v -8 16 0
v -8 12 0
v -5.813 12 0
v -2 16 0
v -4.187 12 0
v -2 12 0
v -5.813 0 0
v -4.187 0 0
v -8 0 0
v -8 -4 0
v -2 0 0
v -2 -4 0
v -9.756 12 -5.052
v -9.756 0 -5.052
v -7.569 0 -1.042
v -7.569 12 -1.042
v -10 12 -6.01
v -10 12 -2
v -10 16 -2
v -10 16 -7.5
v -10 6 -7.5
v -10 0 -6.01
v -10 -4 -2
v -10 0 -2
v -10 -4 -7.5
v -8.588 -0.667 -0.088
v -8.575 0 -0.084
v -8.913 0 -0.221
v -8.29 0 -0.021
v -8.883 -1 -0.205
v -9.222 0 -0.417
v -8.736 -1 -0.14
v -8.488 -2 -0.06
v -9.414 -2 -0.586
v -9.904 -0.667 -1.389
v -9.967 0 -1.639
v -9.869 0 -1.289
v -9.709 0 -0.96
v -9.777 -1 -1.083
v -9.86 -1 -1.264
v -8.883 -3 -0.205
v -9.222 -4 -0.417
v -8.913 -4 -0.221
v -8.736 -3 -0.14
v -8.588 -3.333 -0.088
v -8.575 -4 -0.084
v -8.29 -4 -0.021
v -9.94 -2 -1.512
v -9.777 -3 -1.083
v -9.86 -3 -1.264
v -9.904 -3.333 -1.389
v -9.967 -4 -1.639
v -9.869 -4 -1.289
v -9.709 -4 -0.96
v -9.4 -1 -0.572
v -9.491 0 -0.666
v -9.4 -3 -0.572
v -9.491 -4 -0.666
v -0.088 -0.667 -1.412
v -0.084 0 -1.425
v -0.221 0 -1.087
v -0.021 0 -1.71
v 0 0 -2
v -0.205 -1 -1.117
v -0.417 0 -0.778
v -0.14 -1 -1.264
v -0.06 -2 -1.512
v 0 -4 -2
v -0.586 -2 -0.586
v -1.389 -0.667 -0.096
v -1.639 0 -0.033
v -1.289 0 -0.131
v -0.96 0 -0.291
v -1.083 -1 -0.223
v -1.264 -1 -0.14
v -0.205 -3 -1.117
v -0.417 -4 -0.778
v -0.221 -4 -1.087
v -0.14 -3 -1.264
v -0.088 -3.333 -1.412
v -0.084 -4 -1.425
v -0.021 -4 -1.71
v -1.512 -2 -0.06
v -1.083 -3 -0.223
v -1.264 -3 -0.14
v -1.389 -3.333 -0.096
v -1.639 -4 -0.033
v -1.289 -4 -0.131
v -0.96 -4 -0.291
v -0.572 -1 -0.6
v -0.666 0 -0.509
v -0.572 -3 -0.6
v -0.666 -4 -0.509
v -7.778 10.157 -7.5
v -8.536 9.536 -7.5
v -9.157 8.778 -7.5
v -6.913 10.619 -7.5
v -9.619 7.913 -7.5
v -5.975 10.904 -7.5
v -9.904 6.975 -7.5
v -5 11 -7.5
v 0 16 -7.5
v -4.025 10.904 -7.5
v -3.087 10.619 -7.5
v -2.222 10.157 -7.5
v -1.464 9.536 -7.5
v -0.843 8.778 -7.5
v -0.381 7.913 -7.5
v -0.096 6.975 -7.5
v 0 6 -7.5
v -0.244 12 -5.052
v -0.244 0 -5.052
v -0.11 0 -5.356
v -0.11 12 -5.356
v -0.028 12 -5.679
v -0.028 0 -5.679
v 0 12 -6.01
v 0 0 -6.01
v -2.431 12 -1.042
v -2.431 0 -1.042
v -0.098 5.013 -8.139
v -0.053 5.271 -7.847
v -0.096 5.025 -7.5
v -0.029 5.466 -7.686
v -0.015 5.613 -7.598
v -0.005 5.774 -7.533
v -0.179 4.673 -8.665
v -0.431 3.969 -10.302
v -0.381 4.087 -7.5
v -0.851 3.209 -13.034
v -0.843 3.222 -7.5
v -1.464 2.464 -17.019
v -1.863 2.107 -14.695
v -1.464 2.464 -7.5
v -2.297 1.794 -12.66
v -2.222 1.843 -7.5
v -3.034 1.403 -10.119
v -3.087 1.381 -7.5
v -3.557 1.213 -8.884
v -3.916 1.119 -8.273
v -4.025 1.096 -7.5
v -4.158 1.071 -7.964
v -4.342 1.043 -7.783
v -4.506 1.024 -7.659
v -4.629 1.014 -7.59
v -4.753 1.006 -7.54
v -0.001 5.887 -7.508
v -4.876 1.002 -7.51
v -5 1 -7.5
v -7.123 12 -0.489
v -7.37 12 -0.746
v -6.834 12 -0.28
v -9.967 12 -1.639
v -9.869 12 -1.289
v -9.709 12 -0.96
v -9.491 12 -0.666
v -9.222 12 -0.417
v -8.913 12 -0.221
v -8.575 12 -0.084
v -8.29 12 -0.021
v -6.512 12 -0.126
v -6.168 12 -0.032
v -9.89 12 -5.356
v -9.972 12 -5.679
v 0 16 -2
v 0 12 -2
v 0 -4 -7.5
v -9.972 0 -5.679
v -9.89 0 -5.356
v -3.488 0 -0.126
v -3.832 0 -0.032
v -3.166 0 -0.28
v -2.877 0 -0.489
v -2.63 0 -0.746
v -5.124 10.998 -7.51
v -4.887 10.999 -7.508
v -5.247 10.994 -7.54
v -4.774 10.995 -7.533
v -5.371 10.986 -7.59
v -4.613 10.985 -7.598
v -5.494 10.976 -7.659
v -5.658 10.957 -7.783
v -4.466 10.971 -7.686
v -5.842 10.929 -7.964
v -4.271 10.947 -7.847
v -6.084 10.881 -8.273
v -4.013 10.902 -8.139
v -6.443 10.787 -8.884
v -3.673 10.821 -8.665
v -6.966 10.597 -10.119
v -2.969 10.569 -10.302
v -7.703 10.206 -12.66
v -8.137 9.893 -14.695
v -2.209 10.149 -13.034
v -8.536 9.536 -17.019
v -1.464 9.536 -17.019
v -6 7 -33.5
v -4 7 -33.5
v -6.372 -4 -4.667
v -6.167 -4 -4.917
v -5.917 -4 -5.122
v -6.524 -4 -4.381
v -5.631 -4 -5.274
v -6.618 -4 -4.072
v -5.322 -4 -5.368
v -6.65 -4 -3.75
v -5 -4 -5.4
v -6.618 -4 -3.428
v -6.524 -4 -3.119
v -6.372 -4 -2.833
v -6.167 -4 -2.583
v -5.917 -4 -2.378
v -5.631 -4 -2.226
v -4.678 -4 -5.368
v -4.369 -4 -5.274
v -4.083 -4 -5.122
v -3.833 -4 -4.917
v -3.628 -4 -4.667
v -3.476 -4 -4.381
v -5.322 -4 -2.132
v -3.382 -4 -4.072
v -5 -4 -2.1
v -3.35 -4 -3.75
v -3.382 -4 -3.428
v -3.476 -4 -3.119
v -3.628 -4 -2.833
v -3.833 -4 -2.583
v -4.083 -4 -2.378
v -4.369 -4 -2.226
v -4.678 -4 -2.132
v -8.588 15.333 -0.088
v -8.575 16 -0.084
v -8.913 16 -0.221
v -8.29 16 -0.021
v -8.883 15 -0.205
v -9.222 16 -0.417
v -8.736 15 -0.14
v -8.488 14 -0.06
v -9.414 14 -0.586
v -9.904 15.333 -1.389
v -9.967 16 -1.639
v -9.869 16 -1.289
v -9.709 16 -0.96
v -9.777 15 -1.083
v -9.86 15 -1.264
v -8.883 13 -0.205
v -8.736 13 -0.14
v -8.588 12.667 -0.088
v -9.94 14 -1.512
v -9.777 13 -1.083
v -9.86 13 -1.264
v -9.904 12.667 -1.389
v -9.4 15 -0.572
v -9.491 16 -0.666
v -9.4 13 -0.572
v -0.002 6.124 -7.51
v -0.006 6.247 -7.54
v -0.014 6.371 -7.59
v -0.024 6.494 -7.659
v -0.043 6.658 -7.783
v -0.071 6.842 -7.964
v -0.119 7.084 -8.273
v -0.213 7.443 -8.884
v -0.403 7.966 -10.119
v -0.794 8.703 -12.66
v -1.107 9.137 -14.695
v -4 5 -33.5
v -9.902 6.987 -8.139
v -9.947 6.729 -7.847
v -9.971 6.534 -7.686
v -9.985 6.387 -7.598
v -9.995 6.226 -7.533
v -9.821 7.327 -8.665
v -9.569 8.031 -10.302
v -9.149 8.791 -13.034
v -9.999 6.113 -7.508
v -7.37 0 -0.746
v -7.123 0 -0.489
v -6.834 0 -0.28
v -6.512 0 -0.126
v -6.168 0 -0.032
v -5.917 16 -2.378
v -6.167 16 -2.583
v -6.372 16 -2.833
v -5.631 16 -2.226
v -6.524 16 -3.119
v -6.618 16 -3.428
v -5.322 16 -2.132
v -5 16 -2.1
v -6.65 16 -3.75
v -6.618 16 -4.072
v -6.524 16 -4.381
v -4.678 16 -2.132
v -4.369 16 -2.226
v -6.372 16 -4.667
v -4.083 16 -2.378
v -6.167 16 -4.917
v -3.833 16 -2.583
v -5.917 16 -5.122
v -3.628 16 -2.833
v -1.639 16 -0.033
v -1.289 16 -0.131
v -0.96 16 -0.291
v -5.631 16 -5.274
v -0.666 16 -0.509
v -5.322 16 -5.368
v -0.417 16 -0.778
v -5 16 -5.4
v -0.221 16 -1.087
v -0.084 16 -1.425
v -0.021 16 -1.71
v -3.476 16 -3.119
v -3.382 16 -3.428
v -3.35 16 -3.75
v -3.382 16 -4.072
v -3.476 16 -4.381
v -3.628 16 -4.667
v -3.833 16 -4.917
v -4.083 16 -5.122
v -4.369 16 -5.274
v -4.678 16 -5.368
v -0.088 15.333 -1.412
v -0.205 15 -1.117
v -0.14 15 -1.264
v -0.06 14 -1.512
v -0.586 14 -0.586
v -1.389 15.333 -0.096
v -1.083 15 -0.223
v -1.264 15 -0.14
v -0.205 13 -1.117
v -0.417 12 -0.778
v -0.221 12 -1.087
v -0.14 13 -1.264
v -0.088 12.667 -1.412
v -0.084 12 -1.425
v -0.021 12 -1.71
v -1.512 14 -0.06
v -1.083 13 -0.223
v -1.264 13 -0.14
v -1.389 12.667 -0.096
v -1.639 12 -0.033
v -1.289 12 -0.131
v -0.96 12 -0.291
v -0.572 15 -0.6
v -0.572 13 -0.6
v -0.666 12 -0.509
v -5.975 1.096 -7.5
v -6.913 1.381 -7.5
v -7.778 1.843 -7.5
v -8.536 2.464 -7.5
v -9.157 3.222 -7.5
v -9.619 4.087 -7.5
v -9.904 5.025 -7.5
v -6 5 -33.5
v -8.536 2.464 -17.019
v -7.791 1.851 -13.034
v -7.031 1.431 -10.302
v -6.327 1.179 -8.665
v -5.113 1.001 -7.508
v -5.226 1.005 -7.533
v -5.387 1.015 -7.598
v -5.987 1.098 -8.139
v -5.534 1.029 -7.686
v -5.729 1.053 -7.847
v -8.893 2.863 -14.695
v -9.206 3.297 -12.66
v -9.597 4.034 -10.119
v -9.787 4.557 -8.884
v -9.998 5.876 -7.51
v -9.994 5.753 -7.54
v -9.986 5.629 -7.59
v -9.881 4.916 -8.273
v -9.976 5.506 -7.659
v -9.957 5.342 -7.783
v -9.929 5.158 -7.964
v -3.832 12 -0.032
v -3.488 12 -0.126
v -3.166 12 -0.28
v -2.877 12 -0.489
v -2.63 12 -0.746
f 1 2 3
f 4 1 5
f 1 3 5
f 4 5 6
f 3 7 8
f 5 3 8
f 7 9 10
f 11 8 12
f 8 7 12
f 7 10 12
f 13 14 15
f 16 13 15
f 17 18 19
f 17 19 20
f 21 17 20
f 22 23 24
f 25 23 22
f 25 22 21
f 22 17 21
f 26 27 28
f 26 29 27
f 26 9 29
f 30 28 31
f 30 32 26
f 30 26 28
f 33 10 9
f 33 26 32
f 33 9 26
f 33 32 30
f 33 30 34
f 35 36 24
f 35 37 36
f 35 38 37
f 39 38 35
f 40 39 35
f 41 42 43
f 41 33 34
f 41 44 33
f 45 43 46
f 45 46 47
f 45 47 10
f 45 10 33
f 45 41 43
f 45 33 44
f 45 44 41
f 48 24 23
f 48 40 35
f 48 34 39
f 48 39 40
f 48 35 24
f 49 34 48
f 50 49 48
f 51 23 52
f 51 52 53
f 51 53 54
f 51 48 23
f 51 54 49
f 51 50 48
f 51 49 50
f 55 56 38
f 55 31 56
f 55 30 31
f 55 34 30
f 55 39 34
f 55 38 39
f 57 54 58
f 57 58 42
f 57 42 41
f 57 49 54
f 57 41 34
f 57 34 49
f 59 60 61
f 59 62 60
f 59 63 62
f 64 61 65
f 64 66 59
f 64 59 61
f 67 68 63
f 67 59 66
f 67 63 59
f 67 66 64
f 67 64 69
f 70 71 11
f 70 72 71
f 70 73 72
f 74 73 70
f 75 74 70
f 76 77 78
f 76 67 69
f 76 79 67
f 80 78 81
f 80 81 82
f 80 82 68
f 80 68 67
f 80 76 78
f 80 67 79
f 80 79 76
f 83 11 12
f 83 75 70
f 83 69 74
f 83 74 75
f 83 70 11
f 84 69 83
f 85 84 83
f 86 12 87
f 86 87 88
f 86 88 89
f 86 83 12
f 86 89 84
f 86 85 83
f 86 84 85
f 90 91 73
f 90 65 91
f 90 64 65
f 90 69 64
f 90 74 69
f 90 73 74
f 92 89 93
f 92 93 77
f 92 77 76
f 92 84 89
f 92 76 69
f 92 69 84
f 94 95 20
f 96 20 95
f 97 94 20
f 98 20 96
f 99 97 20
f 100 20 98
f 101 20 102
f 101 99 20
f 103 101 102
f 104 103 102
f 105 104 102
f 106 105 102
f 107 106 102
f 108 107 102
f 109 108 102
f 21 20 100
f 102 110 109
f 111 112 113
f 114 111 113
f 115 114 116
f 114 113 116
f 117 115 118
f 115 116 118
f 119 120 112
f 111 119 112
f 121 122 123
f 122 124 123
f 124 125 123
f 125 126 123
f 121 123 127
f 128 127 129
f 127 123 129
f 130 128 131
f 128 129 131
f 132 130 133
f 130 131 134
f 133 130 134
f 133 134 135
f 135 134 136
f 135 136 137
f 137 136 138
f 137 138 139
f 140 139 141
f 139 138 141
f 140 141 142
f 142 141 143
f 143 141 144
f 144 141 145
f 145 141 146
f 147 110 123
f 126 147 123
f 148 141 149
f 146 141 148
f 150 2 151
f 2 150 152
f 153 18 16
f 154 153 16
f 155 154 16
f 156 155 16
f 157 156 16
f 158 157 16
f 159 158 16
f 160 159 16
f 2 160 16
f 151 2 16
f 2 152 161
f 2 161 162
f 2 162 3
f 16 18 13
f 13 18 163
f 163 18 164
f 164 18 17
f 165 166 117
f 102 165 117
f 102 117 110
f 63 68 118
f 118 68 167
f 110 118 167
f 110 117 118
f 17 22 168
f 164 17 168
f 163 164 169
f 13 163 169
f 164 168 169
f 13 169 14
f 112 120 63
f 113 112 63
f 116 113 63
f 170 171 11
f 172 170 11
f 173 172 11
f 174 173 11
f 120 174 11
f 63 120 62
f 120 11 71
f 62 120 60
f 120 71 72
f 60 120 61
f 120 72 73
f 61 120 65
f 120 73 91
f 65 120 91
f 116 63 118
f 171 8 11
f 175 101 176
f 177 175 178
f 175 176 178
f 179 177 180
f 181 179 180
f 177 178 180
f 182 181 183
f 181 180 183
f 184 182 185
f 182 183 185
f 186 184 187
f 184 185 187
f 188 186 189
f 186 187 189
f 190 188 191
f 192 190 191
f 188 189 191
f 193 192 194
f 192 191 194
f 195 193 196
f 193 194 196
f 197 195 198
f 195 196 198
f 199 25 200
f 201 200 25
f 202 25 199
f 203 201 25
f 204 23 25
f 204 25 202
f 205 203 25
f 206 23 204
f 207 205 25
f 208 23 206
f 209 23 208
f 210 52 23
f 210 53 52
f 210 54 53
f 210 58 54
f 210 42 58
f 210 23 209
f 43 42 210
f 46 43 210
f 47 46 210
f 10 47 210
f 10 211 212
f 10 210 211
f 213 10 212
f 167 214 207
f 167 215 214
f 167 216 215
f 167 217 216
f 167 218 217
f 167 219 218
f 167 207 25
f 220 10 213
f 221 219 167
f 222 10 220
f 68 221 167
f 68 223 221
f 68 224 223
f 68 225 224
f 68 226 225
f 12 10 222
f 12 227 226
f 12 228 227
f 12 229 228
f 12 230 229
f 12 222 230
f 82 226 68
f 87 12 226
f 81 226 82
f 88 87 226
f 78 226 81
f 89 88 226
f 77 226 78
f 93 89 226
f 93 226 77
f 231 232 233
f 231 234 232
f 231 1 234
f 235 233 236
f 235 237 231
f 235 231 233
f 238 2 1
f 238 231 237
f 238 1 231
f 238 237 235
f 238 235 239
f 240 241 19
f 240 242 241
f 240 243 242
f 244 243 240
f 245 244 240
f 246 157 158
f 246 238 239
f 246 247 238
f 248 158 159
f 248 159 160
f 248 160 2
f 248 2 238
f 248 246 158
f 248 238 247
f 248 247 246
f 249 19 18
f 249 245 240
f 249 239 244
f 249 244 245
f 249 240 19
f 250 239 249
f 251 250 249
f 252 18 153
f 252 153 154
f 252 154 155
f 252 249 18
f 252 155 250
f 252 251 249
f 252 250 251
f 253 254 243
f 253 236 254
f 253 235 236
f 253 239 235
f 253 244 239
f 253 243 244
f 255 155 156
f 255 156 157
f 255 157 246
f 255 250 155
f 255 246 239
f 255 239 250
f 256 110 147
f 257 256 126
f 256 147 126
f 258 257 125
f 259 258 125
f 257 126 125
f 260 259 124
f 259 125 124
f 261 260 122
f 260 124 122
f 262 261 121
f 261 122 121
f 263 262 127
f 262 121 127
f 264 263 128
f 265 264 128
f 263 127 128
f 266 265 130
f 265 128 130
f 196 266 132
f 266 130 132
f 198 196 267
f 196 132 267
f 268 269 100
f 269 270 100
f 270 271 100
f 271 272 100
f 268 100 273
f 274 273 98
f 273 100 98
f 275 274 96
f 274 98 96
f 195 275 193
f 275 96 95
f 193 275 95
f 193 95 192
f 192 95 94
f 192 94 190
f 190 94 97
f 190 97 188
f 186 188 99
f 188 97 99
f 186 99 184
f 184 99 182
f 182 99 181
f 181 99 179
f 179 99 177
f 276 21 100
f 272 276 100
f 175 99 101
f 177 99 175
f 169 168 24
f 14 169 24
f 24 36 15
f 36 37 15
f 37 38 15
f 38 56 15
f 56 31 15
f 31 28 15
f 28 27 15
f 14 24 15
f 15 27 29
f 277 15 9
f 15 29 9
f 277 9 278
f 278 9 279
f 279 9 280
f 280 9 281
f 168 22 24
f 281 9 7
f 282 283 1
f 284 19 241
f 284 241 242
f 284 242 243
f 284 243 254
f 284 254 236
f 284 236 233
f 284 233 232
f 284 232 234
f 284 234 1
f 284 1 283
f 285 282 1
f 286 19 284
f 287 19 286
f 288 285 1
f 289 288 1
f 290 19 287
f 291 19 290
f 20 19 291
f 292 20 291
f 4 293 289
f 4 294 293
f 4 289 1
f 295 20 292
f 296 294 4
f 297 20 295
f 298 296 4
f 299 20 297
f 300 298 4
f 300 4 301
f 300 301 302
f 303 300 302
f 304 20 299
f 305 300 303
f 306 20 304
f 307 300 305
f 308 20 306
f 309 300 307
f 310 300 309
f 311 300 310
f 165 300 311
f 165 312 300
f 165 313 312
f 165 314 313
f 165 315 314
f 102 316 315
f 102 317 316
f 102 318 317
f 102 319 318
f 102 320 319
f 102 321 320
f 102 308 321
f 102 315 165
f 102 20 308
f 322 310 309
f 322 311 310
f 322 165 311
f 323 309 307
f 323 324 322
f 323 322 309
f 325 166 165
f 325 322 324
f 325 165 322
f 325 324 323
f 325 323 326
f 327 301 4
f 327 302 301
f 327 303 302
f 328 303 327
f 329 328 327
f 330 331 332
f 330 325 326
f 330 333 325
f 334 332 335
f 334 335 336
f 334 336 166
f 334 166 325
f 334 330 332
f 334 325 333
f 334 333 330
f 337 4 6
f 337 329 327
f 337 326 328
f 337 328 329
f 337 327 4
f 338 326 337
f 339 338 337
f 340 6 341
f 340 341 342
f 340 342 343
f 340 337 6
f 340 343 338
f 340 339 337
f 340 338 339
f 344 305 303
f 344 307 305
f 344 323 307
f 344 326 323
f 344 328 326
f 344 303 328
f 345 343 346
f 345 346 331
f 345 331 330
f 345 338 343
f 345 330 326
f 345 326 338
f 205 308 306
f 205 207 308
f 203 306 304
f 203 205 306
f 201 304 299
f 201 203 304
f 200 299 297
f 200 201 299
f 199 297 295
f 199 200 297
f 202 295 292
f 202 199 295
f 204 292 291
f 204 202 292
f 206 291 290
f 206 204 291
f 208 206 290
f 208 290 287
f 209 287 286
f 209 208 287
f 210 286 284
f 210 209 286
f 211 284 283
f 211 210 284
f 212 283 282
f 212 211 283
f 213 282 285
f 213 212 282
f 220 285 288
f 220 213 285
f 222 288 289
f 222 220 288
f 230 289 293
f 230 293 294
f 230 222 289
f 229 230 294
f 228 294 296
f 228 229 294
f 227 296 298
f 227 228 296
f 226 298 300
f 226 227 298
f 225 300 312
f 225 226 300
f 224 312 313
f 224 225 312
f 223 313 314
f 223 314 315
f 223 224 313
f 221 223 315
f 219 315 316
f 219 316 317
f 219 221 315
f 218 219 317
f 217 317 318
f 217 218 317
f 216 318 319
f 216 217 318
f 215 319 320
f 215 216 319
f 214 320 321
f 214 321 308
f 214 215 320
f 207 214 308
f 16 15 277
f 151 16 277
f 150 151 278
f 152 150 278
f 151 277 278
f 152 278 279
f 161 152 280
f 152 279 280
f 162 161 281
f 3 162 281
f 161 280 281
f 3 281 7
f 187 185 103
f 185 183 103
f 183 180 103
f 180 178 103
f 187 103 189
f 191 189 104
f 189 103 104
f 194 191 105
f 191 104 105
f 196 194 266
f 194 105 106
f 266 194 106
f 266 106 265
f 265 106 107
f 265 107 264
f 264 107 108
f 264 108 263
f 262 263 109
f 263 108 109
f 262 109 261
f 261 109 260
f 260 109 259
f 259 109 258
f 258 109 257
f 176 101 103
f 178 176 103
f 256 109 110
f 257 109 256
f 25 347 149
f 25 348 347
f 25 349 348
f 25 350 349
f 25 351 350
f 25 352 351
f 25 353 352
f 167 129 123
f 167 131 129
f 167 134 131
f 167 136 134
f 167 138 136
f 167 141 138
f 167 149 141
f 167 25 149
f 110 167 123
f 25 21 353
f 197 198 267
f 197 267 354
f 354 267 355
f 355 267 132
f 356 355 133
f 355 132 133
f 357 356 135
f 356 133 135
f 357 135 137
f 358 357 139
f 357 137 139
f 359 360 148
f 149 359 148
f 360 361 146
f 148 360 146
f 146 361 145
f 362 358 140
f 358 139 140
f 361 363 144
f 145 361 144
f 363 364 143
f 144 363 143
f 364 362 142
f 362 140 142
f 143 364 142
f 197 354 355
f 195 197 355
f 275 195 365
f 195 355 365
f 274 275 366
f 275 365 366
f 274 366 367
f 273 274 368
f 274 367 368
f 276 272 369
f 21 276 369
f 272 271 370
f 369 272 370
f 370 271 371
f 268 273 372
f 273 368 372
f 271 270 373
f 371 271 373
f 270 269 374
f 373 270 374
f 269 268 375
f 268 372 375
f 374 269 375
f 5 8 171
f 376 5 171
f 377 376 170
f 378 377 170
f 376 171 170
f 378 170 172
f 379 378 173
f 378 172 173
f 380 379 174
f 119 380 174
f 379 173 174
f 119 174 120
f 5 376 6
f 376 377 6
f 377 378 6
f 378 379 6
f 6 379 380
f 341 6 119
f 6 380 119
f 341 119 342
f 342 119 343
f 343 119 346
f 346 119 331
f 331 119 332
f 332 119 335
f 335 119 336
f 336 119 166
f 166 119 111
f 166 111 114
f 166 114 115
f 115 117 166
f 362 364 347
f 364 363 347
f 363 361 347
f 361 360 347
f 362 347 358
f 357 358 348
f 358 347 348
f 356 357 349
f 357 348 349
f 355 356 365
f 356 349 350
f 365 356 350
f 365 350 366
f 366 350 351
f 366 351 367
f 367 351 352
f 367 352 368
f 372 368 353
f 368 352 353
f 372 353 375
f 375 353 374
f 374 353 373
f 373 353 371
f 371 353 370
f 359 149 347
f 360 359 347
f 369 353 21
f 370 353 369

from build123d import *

# Parameters (mm, degrees)
SKETCH1_R           = 1.65
BOSS_EXTRUDE1_DEPTH = 12
BOSS_EXTRUDE2_START = 4
SKETCH2_W           = 10
SKETCH2_H           = 7.5
SKETCH2_R           = 1.65
BOSS_EXTRUDE2_DEPTH = 4
SKETCH3_W           = 10
SKETCH3_H           = 7.5
SKETCH3_R           = 1.65
BOSS_EXTRUDE3_DEPTH = 4
SKETCH4_R           = 5
BOSS_EXTRUDE4_DEPTH = 26
CUT_EXTRUDE1_DEPTH  = 39.448016854
CUT_EXTRUDE2_DEPTH  = 41.277164746
VARFILLET1_R        = 2


with BuildPart() as part:
    # Sketch1 → Boss-Extrude1 (new body)
    with BuildSketch(Plane(origin=(0, 0, 0), x_dir=(1, 0, 0), z_dir=(0, 1, 0))):
        with BuildLine():
            Line((-10, 7.5), (-10, 6.009988029))
            ThreePointArc((-10, 6.009988029), (-9.937986364, 5.515813106), (-9.755791146, 5.052283767))
            Line((-9.755791146, 5.052283767), (-7.568524948, 1.042295739))
            ThreePointArc((-7.568524948, 1.042295739), (-6.833662663, 0.280202261), (-5.812733803, 0))
            Line((-5.812733803, 0), (-4.187266197, 0))
            ThreePointArc((-4.187266197, 0), (-3.166337337, 0.280202261), (-2.431475052, 1.042295739))
            Line((-2.431475052, 1.042295739), (-0.244208854, 5.052283767))
            ThreePointArc((-0.244208854, 5.052283767), (-0.062013636, 5.515813106), (0, 6.009988029))
            Line((0, 6.009988029), (0, 7.5))
            Line((0, 7.5), (-10, 7.5))
        make_face()
        with Locations((-5, 3.75)):
            Circle(SKETCH1_R, mode=Mode.SUBTRACT)
    extrude(amount=BOSS_EXTRUDE1_DEPTH)

    # Sketch2 → Boss-Extrude2 (add)
    with BuildSketch(Plane.XZ.offset(BOSS_EXTRUDE2_START)):
        with Locations((-5, -3.75)):
            Rectangle(SKETCH2_W, SKETCH2_H)
        with Locations((-5, -3.75)):
            Circle(SKETCH2_R, mode=Mode.SUBTRACT)
    extrude(amount=-BOSS_EXTRUDE2_DEPTH)

    # Sketch3 → Boss-Extrude3 (add)
    with BuildSketch(Plane(origin=(0, 12, 0), x_dir=(1, 0, 0), z_dir=(0, 1, 0))):
        with Locations((-5, 3.75)):
            Rectangle(SKETCH3_W, SKETCH3_H)
        with Locations((-5, 3.75)):
            Circle(SKETCH3_R, mode=Mode.SUBTRACT)
    extrude(amount=BOSS_EXTRUDE3_DEPTH)

    # Sketch4 → Boss-Extrude4 (add)
    with BuildSketch(Plane(origin=(0, 0, -7.5), x_dir=(-1, 0, 0), z_dir=(0, 0, -1))):
        with Locations((5, 6)):
            Circle(SKETCH4_R)
    extrude(amount=BOSS_EXTRUDE4_DEPTH)

    # Sketch5 → Cut-Extrude1 (cut, through all)
    with BuildSketch(Plane(origin=(0, 0, 0), x_dir=(0, 0, -1), z_dir=(1, 0, 0))):
        Polygon((33.5, 11), (7.5, 11), (33.5, 7), align=None)
        Polygon((33.5, 1), (33.5, 5), (7.5, 1), align=None)
    extrude(amount=-CUT_EXTRUDE1_DEPTH, mode=Mode.SUBTRACT)

    # Sketch6 → Cut-Extrude2 (cut, through all)
    with BuildSketch(Plane(origin=(0, -4, 0), x_dir=(-1, 0, 0), z_dir=(0, -1, 0))):
        Polygon((0, 7.5), (4, 33.5), (0, 33.5), align=None)
        Polygon((10, 33.5), (6, 33.5), (10, 7.5), align=None)
    extrude(amount=-CUT_EXTRUDE2_DEPTH, mode=Mode.SUBTRACT)

    # VarFillet1
    varfillet1_edges = [part.edges().sort_by_distance(p)[0] for p in [
        (0, 14, 0),
        (-10, 14, 0),
        (-10, -2, 0),
        (0, -2, 0),
    ]]
    fillet(varfillet1_edges, radius=VARFILLET1_R)


solid = part.part
